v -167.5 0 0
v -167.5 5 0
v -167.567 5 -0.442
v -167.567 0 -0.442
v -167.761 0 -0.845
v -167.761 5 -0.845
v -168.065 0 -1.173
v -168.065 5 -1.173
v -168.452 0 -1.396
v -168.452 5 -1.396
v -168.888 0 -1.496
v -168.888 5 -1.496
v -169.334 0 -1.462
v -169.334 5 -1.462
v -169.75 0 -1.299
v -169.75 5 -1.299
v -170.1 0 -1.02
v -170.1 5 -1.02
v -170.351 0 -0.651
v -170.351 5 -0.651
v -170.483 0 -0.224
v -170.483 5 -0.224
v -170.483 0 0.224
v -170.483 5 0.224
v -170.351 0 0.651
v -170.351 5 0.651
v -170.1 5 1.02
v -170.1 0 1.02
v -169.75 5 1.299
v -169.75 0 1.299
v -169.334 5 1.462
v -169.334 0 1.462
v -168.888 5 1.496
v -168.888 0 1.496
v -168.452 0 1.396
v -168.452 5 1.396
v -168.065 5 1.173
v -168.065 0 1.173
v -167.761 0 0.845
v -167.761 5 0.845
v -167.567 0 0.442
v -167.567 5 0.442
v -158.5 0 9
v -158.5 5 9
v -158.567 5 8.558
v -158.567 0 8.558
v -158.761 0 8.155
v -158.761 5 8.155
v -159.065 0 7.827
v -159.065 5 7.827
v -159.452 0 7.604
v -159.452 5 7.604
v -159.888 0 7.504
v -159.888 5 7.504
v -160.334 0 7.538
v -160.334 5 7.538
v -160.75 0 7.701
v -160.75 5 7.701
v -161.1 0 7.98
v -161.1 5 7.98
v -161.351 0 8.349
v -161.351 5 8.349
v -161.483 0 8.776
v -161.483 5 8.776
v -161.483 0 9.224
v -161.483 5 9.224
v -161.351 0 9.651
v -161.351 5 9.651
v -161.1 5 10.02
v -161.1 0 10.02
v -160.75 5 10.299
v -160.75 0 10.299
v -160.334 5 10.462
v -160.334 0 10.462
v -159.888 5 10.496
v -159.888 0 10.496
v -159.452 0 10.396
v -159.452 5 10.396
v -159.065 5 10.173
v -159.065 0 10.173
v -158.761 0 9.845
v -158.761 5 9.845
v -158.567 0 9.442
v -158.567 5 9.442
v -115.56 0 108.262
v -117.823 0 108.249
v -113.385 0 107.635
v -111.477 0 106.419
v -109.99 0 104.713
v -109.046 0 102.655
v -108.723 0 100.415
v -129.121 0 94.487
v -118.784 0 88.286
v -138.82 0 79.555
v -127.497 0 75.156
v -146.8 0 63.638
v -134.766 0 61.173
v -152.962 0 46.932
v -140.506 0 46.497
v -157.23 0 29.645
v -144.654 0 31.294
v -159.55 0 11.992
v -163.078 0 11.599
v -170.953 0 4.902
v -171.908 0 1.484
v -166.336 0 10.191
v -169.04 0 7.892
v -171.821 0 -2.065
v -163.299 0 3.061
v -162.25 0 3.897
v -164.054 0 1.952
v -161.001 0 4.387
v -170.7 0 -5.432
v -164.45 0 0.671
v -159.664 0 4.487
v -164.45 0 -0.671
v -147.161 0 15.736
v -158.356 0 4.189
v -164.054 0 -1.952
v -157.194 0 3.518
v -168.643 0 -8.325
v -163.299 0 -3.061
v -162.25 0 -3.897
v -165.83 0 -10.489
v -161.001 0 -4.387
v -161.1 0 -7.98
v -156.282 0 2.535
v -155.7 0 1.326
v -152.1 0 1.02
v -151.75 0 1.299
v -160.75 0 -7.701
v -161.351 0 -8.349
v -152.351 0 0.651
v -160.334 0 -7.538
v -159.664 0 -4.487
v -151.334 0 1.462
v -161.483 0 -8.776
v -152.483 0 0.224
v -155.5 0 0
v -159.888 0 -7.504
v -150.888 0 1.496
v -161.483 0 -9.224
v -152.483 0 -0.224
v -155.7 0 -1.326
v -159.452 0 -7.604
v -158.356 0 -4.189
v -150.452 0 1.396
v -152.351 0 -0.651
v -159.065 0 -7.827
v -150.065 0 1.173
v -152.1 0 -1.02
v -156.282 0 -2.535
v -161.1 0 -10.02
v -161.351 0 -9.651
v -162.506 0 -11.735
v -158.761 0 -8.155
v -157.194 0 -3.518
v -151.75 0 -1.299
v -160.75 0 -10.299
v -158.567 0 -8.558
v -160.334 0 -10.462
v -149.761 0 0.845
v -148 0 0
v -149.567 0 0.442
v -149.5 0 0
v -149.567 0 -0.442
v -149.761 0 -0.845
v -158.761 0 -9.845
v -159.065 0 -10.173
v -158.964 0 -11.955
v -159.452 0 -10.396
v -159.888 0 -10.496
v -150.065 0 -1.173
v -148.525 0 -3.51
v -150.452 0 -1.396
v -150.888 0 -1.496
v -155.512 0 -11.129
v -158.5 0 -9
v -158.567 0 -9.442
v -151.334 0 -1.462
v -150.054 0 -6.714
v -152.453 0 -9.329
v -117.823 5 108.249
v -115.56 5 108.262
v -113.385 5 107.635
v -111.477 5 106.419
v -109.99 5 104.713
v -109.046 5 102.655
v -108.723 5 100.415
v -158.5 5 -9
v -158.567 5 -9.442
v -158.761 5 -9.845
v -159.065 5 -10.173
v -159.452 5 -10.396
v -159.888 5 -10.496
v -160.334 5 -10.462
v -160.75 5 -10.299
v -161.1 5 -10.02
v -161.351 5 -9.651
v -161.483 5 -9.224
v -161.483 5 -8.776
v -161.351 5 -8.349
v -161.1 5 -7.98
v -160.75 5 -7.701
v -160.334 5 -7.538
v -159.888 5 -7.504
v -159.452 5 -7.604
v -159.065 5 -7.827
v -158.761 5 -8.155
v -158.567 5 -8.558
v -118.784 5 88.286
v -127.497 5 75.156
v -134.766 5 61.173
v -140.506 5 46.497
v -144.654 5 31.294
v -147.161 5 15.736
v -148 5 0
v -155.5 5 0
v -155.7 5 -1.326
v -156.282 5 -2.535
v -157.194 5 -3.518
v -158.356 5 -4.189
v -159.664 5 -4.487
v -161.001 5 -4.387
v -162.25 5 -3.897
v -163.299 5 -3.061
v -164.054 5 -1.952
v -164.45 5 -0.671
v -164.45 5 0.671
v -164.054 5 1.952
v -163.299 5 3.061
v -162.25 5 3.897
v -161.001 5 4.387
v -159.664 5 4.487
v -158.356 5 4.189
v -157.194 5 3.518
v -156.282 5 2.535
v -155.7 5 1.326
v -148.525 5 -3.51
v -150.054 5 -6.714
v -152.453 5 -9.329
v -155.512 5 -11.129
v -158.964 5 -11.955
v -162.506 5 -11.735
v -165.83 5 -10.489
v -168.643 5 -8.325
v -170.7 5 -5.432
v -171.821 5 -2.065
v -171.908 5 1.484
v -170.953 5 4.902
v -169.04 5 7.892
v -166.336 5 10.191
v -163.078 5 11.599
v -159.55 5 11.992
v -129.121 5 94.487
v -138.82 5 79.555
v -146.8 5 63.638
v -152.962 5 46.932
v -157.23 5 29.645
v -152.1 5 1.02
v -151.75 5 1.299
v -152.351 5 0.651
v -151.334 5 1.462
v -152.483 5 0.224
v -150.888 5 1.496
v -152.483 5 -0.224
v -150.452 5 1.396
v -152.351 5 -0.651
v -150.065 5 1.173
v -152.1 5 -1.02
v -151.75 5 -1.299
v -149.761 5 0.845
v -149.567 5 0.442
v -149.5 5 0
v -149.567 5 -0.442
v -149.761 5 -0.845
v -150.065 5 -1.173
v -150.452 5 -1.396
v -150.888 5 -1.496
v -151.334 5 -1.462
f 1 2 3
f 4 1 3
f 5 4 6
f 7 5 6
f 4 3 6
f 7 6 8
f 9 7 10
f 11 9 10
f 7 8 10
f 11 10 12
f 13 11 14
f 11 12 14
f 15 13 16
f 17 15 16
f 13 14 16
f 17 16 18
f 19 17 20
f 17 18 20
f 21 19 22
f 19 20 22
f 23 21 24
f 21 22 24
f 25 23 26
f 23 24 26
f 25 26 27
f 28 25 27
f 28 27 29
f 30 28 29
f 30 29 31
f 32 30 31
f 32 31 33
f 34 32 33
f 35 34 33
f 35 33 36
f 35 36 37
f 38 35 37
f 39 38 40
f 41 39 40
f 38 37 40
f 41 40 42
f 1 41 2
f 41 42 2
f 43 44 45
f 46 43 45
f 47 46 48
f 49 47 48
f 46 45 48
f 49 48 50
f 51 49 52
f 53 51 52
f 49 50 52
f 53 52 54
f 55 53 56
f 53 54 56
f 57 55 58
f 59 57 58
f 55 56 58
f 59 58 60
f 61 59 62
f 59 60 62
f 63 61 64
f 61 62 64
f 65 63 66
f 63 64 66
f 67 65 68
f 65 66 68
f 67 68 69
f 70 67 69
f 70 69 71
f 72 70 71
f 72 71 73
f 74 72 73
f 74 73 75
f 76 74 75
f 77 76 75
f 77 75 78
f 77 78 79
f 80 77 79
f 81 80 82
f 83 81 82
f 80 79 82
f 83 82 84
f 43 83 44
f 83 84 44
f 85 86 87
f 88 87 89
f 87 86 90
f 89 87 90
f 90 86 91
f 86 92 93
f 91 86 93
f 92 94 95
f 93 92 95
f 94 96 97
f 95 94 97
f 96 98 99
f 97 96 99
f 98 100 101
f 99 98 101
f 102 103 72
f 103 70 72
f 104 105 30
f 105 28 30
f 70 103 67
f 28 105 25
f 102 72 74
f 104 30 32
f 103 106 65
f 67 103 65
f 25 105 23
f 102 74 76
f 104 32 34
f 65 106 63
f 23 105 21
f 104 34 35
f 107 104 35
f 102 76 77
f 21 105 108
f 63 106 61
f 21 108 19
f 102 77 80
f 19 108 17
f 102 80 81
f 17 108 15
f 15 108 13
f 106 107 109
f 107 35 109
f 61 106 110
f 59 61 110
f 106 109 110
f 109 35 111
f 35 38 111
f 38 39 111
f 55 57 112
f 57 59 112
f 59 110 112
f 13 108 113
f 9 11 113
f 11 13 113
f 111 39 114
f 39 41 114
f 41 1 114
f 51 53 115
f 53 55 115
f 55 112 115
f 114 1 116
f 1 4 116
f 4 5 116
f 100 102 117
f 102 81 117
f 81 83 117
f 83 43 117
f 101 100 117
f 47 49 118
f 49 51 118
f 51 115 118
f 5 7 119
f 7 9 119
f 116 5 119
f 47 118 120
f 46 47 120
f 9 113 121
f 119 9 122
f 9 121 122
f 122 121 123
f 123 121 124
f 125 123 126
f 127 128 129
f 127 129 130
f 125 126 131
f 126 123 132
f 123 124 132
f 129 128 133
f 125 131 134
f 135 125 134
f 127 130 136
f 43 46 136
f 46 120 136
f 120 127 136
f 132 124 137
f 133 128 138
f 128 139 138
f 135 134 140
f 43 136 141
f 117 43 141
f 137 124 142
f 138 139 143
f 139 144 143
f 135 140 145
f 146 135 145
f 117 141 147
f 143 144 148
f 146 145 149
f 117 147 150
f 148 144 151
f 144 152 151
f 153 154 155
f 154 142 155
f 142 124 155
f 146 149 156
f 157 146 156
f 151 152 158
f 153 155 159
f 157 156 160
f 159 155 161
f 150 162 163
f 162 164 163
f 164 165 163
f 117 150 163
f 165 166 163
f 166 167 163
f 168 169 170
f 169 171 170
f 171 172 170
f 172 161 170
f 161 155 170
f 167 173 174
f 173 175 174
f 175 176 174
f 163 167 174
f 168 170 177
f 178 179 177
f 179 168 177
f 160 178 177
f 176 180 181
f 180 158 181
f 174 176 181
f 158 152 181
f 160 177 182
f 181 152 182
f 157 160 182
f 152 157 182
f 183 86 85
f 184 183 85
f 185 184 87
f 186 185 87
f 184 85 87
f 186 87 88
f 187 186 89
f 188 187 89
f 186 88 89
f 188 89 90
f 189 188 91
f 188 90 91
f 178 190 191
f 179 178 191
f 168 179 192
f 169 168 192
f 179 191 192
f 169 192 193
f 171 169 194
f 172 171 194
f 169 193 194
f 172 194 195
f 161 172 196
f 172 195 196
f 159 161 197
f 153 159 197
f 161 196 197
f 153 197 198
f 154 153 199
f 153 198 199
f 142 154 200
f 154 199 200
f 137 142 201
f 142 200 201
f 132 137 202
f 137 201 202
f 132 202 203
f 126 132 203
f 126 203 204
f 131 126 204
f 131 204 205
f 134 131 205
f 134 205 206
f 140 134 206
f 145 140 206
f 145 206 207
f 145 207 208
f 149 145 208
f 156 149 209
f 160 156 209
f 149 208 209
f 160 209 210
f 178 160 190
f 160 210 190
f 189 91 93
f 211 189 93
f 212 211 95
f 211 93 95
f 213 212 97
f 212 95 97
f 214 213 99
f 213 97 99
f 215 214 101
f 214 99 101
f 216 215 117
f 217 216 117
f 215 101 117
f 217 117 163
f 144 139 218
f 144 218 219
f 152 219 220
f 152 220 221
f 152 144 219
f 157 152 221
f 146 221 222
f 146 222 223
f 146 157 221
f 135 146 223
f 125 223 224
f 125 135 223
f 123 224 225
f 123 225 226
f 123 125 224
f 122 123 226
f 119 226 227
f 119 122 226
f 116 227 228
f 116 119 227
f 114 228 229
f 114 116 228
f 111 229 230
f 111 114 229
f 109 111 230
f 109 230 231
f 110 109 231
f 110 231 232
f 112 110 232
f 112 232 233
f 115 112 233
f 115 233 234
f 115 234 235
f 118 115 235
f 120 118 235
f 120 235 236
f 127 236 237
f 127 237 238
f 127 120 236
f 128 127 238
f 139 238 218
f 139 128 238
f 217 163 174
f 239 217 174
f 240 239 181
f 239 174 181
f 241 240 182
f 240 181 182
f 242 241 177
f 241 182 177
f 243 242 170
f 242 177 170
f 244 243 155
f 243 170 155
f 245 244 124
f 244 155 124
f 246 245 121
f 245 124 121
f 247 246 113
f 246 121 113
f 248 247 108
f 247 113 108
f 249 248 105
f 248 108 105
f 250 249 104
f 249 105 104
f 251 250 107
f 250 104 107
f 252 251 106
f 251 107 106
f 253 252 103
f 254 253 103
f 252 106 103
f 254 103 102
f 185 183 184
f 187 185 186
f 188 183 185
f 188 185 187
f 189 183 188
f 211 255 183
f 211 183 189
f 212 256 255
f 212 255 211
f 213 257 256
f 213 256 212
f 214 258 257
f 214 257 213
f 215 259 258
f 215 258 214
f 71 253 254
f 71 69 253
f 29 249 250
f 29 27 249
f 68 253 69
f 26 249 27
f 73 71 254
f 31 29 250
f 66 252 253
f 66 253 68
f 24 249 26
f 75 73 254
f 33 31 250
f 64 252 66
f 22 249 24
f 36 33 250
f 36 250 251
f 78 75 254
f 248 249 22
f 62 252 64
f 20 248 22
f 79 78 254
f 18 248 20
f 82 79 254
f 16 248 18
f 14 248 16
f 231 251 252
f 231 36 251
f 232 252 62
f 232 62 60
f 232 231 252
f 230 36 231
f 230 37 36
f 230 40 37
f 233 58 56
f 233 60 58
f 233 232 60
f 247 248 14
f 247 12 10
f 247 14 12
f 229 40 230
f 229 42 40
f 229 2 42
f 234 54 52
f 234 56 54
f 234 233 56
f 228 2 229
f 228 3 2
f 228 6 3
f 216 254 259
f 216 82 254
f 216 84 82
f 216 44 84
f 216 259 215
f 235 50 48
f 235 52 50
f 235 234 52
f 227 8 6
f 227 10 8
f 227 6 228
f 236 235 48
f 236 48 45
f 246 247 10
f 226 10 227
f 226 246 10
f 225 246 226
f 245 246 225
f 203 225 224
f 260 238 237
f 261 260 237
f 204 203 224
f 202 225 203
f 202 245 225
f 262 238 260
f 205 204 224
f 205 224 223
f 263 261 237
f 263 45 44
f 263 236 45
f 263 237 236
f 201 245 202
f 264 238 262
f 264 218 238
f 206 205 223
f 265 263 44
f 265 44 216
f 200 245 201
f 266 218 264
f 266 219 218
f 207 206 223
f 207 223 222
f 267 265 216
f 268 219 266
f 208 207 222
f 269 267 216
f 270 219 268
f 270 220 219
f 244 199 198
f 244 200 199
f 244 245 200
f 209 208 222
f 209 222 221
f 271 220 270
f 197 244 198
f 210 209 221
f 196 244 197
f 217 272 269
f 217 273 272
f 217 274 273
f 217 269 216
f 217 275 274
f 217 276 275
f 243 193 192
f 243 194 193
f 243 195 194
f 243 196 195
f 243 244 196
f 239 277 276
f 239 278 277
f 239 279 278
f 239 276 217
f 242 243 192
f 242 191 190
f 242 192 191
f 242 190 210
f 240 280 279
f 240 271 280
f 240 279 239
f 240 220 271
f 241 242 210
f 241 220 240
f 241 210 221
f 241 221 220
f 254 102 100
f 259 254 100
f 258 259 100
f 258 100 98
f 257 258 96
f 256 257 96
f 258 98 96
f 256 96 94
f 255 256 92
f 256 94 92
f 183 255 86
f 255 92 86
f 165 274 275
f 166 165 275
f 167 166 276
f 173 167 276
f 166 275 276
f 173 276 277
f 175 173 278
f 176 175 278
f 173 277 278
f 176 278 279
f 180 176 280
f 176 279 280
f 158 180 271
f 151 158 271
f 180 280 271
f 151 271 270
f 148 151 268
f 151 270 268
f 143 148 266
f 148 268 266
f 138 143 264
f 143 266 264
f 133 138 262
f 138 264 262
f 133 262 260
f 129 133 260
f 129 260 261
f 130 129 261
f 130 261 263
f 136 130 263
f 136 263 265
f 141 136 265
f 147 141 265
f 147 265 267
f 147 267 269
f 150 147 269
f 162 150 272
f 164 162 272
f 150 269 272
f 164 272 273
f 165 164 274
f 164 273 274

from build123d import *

# Parameters (mm, degrees)
ESQUISSE1_R             = 4.5
BOSS_EXTRU_1_DEPTH      = 5
ESQUISSE2_R             = 1.5
ENL_V_MAT_EXTRU_1_DEPTH = 5


with BuildPart() as part:
    # Esquisse1 → Boss.-Extru.1 (new body)
    with BuildSketch(Plane(origin=(0, 0, 0), x_dir=(1, 0, 0), z_dir=(0, 1, 0))):
        with BuildLine():
            ThreePointArc((-148, 0), (-168.642916175, 8.324662155), (-159.55, -11.991559532))
            ThreePointArc((-159.55, -11.991559532), (-146.800083184, -63.637532772), (-117.822638991, -108.24890642))
            ThreePointArc((-117.822638991, -108.24890642), (-111.47655915, -106.418874078), (-108.723180083, -100.415487414))
            ThreePointArc((-108.723180083, -100.415487414), (-137.831474367, -53.911823136), (-148, 0))
        make_face()
        with Locations((-160, 0)):
            Circle(ESQUISSE1_R, mode=Mode.SUBTRACT)
    extrude(amount=BOSS_EXTRU_1_DEPTH)

    # Esquisse2 → Enlèv. mat.-Extru.1 (cut)
    with BuildSketch(Plane(origin=(0, 5, 0), x_dir=(1, 0, 0), z_dir=(0, 1, 0))):
        with Locations((-151, 0)):
            Circle(ESQUISSE2_R)
        with Locations((-160, -9)):
            Circle(ESQUISSE2_R)
        with Locations((-169, 0)):
            Circle(ESQUISSE2_R)
        with Locations((-160, 9)):
            Circle(ESQUISSE2_R)
    extrude(amount=-ENL_V_MAT_EXTRU_1_DEPTH, mode=Mode.SUBTRACT)


solid = part.part
